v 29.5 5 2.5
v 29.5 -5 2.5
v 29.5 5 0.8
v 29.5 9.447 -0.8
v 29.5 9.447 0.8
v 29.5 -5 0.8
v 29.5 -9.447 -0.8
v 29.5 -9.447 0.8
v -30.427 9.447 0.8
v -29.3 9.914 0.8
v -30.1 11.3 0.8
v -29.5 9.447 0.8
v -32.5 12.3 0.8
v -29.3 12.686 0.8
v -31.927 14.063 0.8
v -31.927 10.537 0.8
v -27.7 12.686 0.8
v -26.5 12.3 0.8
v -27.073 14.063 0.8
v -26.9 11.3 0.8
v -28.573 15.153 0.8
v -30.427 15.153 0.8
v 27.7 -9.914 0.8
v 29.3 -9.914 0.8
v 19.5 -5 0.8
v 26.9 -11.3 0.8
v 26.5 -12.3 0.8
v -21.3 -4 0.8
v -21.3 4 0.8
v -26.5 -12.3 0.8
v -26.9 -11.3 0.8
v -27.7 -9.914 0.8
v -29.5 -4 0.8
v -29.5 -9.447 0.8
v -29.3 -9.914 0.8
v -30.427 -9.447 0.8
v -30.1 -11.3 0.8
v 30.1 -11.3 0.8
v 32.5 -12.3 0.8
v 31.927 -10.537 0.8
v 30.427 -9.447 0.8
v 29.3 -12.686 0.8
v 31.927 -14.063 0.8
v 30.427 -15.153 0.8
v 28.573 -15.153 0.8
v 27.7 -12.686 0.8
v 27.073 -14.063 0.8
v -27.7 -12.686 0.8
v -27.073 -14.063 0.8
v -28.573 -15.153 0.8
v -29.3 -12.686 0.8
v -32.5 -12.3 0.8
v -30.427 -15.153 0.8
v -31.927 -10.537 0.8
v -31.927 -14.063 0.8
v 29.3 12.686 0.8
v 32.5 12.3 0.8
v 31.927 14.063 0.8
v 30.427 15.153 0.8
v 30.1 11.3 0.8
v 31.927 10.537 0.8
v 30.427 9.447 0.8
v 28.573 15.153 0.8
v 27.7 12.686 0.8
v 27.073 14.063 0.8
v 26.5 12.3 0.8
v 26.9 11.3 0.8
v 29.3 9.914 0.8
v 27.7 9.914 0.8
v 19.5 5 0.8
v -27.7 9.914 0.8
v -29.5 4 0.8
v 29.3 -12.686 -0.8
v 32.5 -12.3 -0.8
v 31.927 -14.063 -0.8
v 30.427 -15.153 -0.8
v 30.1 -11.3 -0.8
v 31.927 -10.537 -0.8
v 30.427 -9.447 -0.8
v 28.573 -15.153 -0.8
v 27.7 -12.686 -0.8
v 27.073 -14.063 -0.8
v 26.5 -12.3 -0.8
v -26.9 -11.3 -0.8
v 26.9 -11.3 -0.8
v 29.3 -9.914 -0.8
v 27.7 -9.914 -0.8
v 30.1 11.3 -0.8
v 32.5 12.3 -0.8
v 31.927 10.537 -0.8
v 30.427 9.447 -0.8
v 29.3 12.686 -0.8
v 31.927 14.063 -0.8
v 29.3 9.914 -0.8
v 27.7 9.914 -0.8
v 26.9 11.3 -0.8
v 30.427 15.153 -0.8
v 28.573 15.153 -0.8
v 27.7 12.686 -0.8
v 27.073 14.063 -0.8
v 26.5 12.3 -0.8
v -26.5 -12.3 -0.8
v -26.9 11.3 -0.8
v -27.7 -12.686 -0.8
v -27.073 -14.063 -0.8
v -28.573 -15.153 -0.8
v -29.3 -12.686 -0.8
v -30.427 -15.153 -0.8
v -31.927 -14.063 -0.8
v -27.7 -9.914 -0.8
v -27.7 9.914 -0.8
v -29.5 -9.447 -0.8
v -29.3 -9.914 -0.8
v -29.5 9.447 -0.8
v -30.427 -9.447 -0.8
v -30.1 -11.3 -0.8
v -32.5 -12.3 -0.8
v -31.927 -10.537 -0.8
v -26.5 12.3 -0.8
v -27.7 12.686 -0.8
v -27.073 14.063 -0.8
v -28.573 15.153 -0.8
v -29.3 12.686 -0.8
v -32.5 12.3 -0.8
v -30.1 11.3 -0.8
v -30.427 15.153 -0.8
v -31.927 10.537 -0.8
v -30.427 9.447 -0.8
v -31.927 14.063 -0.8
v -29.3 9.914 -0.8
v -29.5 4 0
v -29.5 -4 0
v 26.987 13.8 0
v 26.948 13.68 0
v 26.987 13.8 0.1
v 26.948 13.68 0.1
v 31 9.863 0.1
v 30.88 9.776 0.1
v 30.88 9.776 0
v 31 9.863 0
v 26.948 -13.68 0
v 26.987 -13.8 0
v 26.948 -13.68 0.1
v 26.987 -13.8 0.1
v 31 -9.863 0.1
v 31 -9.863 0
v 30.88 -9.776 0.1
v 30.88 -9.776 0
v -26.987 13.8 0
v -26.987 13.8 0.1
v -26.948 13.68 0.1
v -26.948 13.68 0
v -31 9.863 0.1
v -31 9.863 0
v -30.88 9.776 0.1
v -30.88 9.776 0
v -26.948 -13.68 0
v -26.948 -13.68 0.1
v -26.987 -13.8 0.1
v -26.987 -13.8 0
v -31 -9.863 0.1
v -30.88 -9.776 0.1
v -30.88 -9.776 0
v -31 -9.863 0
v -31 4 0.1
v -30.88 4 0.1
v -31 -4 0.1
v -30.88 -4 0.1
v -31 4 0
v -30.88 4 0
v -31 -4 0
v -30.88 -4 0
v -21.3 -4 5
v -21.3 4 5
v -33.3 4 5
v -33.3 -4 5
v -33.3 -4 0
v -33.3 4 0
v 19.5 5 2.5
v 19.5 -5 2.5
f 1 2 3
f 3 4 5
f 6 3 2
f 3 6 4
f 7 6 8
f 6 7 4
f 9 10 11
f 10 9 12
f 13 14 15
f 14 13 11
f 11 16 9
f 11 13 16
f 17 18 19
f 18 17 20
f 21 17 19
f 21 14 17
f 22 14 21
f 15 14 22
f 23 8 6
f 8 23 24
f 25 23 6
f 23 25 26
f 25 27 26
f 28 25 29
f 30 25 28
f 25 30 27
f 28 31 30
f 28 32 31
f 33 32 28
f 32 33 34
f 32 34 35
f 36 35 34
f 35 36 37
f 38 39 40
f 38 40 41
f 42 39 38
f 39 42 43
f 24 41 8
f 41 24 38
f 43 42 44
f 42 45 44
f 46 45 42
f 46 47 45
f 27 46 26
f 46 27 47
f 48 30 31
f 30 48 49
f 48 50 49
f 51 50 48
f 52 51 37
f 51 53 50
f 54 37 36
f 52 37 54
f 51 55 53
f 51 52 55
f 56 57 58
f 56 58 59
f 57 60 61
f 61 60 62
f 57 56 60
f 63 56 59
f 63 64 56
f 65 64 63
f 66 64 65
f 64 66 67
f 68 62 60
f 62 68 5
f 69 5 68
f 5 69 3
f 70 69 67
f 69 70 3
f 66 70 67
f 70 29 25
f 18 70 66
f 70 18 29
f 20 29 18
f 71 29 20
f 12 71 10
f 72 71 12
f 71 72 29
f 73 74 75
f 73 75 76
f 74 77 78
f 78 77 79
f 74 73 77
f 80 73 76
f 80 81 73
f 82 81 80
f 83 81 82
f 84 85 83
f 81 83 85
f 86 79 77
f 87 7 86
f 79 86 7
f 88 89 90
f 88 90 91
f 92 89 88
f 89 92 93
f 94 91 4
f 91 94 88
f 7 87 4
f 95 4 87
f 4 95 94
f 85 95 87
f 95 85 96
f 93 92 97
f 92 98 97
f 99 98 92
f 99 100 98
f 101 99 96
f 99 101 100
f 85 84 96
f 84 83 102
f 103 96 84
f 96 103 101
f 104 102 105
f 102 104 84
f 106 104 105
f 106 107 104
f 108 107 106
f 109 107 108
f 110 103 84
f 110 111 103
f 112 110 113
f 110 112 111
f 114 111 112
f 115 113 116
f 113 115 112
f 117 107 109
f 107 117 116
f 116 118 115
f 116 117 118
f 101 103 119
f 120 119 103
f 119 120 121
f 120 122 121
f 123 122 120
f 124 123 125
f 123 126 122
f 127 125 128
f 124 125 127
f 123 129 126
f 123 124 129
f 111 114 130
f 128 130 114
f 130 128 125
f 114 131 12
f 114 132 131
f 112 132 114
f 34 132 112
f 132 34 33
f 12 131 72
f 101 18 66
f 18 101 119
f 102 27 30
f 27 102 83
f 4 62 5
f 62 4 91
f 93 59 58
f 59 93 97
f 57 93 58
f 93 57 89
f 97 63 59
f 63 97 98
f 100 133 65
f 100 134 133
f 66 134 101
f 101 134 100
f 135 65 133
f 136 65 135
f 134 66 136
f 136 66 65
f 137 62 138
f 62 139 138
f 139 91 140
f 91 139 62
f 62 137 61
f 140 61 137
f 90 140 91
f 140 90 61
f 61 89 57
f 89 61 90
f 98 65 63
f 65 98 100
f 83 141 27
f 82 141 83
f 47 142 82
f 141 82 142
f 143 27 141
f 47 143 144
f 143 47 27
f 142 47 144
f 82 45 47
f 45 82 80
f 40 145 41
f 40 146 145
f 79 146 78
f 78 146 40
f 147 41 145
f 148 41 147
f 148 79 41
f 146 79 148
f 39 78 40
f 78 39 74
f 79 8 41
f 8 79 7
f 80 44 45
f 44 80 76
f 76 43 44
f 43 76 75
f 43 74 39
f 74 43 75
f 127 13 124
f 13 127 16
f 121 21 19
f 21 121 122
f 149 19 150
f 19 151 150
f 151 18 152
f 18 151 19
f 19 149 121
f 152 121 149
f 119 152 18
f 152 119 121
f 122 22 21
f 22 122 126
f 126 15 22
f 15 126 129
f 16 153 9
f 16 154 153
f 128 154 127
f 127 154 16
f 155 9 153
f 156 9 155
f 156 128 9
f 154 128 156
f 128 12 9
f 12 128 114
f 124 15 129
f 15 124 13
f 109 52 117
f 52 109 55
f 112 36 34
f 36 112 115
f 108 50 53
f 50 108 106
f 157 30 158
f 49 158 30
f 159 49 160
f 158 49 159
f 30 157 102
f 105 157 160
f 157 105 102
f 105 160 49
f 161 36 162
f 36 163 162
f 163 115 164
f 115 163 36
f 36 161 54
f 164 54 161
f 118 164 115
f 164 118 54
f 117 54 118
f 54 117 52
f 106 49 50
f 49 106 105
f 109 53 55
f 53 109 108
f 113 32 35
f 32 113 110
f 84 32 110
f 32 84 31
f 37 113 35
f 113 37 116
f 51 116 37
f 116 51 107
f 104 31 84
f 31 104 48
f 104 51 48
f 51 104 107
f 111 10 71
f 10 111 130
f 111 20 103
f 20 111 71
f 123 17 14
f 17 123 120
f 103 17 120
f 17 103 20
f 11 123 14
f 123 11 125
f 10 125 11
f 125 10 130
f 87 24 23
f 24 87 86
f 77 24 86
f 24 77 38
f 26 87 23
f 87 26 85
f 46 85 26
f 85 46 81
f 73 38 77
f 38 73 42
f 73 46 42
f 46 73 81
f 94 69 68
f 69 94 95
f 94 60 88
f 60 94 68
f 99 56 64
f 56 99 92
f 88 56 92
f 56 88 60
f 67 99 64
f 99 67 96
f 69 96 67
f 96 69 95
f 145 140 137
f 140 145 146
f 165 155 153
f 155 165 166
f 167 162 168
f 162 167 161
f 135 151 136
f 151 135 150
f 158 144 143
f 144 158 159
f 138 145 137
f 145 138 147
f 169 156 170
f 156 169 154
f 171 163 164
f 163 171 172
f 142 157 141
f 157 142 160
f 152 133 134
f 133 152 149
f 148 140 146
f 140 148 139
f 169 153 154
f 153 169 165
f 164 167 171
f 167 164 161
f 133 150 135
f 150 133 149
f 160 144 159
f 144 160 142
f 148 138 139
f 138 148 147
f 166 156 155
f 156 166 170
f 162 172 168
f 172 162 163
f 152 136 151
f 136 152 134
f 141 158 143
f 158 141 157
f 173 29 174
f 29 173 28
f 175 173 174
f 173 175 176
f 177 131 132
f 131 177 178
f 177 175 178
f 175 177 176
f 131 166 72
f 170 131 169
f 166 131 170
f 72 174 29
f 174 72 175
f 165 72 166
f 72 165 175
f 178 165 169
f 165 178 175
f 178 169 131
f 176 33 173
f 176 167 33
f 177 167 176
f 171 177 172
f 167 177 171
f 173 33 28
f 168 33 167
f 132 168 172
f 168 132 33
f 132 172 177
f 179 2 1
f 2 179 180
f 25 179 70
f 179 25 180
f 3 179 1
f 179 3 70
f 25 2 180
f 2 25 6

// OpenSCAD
// Parameters
board_length = 65.0; //[32.5:130.0:0.1]
board_width = 30.6; //[15.3:61.2:0.1]
board_thickness = 1.6; //[0.8:3.2:0.1]
corner_radius = 3.0; //[1.0:6.0:0.1]
hole_diameter = 3.2; //[2.0:4.5:0.1]
hole_edge_offset = 4.0; //[2.5:8.0:0.1]
connector_length = 12.0; //[6.0:24.0:0.1]
connector_width = 8.0; //[4.0:16.0:0.1]
connector_height = 5.0; //[2.5:10.0:0.1]
sensor_length = 10.0; //[5.0:20.0:0.1]
sensor_width = 10.0; //[5.0:20.0:0.1]
sensor_height = 2.5; //[1.0:6.0:0.1]
silkscreen_thickness = 0.1; //[0.05:0.3:0.01]
silkscreen_margin = 1.5; //[0.5:4.0:0.1]
overlap = 0.8; //[0.5:2.0:0.1]

// Base Shapes
module pcb_core_box() {
  cube([board_length - 2*corner_radius, board_width - 2*corner_radius, board_thickness], center=true);
}

module corner_cylinder(x, y) {
  translate([x, y, 0])
    cylinder(r=corner_radius, h=board_thickness, center=true);
}

module mount_hole(x, y) {
  translate([x, y, 0])
    cylinder(r=hole_diameter/2, h=board_thickness + 2*overlap, center=true);
}

module connector_body() {
  translate([-(board_length/2) + connector_length/2 - overlap, 0, board_thickness/2 + connector_height/2 - overlap])
    cube([connector_length, connector_width, connector_height], center=true);
}

module sensor_package() {
  translate([board_length/2 - corner_radius - sensor_length/2, 0, board_thickness/2 + sensor_height/2 - overlap])
    cube([sensor_length, sensor_width, sensor_height], center=true);
}

module silkscreen_border() {
  translate([0, 0, board_thickness/2 + silkscreen_thickness/2 - overlap])
    difference() {
      cube([board_length - 2*silkscreen_margin, board_width - 2*silkscreen_margin, silkscreen_thickness], center=true);
      cube([board_length - 2*(silkscreen_margin + 1.2*silkscreen_thickness), board_width - 2*(silkscreen_margin + 1.2*silkscreen_thickness), silkscreen_thickness + 2*overlap], center=true);
    }
}

// Operations
module rounded_corners() {
  union() {
    pcb_core_box();
    corner_cylinder(board_length/2 - corner_radius, board_width/2 - corner_radius);
    corner_cylinder(board_length/2 - corner_radius, -(board_width/2 - corner_radius));
    corner_cylinder(-(board_length/2 - corner_radius), board_width/2 - corner_radius);
    corner_cylinder(-(board_length/2 - corner_radius), -(board_width/2 - corner_radius));
  }
}

module pcb_board() {
  difference() {
    rounded_corners();
    mount_hole(-(board_length/2 - hole_edge_offset), -(board_width/2 - hole_edge_offset));
    mount_hole(-(board_length/2 - hole_edge_offset), board_width/2 - hole_edge_offset);
    mount_hole(board_length/2 - hole_edge_offset, -(board_width/2 - hole_edge_offset));
    mount_hole(board_length/2 - hole_edge_offset, board_width/2 - hole_edge_offset);
  }
}

module complete_model() {
  union() {
    pcb_board();
    connector_body();
    sensor_package();
    silkscreen_border();
  }
}

// Final Output
color([0.0, 0.4, 0.2]) // PCB color
complete_model();
